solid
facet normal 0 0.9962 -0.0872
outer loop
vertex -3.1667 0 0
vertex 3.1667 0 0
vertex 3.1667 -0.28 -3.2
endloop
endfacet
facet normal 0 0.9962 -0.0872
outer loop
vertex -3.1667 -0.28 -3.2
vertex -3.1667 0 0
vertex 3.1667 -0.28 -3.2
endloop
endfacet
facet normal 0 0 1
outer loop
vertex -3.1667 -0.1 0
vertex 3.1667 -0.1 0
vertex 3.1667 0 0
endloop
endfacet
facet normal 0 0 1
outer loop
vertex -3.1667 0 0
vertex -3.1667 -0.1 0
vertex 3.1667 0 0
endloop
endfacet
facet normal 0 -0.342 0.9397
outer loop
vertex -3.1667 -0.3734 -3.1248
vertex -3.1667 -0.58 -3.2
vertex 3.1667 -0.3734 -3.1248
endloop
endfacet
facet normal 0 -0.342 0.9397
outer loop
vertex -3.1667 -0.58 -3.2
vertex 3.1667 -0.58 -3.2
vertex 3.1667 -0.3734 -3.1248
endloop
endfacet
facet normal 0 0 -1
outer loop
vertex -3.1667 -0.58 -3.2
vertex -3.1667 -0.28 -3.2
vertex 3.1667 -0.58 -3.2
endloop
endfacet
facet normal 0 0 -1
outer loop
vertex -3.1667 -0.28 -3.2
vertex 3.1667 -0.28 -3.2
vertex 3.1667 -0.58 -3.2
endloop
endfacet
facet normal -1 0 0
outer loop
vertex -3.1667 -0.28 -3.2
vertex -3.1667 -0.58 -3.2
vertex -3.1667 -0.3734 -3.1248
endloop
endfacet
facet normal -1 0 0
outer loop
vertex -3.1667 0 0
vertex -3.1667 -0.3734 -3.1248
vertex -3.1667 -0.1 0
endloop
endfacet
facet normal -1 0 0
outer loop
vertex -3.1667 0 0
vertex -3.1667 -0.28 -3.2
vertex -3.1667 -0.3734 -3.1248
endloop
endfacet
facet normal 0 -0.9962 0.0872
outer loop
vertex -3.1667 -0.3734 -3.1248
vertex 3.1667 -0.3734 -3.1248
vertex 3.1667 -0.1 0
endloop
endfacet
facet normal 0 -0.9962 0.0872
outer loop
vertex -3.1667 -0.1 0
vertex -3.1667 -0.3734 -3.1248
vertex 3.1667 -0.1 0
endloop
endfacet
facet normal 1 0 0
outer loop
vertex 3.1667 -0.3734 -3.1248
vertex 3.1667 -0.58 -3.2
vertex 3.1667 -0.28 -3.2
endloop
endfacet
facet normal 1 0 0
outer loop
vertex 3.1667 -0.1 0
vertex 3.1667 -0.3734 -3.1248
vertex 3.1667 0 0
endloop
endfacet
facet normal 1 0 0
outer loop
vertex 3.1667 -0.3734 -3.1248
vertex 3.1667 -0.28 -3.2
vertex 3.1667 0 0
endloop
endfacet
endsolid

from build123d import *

# Parameters (mm, degrees)
EXTRUDE1_DEPTH = 3.166666667


with BuildPart() as part:
    # Sketch1 → Extrude1 (new body, symmetric)
    with BuildSketch(Plane(origin=(0, 0, 0), x_dir=(0, 0, -1), z_dir=(1, 0, 0))):
        Polygon((0, 0), (3.2, -0.279963723), (3.2, -0.579963723), (3.124811712, -0.3733856), (0, -0.1), align=None)
    extrude(amount=EXTRUDE1_DEPTH, both=True)


solid = part.part
